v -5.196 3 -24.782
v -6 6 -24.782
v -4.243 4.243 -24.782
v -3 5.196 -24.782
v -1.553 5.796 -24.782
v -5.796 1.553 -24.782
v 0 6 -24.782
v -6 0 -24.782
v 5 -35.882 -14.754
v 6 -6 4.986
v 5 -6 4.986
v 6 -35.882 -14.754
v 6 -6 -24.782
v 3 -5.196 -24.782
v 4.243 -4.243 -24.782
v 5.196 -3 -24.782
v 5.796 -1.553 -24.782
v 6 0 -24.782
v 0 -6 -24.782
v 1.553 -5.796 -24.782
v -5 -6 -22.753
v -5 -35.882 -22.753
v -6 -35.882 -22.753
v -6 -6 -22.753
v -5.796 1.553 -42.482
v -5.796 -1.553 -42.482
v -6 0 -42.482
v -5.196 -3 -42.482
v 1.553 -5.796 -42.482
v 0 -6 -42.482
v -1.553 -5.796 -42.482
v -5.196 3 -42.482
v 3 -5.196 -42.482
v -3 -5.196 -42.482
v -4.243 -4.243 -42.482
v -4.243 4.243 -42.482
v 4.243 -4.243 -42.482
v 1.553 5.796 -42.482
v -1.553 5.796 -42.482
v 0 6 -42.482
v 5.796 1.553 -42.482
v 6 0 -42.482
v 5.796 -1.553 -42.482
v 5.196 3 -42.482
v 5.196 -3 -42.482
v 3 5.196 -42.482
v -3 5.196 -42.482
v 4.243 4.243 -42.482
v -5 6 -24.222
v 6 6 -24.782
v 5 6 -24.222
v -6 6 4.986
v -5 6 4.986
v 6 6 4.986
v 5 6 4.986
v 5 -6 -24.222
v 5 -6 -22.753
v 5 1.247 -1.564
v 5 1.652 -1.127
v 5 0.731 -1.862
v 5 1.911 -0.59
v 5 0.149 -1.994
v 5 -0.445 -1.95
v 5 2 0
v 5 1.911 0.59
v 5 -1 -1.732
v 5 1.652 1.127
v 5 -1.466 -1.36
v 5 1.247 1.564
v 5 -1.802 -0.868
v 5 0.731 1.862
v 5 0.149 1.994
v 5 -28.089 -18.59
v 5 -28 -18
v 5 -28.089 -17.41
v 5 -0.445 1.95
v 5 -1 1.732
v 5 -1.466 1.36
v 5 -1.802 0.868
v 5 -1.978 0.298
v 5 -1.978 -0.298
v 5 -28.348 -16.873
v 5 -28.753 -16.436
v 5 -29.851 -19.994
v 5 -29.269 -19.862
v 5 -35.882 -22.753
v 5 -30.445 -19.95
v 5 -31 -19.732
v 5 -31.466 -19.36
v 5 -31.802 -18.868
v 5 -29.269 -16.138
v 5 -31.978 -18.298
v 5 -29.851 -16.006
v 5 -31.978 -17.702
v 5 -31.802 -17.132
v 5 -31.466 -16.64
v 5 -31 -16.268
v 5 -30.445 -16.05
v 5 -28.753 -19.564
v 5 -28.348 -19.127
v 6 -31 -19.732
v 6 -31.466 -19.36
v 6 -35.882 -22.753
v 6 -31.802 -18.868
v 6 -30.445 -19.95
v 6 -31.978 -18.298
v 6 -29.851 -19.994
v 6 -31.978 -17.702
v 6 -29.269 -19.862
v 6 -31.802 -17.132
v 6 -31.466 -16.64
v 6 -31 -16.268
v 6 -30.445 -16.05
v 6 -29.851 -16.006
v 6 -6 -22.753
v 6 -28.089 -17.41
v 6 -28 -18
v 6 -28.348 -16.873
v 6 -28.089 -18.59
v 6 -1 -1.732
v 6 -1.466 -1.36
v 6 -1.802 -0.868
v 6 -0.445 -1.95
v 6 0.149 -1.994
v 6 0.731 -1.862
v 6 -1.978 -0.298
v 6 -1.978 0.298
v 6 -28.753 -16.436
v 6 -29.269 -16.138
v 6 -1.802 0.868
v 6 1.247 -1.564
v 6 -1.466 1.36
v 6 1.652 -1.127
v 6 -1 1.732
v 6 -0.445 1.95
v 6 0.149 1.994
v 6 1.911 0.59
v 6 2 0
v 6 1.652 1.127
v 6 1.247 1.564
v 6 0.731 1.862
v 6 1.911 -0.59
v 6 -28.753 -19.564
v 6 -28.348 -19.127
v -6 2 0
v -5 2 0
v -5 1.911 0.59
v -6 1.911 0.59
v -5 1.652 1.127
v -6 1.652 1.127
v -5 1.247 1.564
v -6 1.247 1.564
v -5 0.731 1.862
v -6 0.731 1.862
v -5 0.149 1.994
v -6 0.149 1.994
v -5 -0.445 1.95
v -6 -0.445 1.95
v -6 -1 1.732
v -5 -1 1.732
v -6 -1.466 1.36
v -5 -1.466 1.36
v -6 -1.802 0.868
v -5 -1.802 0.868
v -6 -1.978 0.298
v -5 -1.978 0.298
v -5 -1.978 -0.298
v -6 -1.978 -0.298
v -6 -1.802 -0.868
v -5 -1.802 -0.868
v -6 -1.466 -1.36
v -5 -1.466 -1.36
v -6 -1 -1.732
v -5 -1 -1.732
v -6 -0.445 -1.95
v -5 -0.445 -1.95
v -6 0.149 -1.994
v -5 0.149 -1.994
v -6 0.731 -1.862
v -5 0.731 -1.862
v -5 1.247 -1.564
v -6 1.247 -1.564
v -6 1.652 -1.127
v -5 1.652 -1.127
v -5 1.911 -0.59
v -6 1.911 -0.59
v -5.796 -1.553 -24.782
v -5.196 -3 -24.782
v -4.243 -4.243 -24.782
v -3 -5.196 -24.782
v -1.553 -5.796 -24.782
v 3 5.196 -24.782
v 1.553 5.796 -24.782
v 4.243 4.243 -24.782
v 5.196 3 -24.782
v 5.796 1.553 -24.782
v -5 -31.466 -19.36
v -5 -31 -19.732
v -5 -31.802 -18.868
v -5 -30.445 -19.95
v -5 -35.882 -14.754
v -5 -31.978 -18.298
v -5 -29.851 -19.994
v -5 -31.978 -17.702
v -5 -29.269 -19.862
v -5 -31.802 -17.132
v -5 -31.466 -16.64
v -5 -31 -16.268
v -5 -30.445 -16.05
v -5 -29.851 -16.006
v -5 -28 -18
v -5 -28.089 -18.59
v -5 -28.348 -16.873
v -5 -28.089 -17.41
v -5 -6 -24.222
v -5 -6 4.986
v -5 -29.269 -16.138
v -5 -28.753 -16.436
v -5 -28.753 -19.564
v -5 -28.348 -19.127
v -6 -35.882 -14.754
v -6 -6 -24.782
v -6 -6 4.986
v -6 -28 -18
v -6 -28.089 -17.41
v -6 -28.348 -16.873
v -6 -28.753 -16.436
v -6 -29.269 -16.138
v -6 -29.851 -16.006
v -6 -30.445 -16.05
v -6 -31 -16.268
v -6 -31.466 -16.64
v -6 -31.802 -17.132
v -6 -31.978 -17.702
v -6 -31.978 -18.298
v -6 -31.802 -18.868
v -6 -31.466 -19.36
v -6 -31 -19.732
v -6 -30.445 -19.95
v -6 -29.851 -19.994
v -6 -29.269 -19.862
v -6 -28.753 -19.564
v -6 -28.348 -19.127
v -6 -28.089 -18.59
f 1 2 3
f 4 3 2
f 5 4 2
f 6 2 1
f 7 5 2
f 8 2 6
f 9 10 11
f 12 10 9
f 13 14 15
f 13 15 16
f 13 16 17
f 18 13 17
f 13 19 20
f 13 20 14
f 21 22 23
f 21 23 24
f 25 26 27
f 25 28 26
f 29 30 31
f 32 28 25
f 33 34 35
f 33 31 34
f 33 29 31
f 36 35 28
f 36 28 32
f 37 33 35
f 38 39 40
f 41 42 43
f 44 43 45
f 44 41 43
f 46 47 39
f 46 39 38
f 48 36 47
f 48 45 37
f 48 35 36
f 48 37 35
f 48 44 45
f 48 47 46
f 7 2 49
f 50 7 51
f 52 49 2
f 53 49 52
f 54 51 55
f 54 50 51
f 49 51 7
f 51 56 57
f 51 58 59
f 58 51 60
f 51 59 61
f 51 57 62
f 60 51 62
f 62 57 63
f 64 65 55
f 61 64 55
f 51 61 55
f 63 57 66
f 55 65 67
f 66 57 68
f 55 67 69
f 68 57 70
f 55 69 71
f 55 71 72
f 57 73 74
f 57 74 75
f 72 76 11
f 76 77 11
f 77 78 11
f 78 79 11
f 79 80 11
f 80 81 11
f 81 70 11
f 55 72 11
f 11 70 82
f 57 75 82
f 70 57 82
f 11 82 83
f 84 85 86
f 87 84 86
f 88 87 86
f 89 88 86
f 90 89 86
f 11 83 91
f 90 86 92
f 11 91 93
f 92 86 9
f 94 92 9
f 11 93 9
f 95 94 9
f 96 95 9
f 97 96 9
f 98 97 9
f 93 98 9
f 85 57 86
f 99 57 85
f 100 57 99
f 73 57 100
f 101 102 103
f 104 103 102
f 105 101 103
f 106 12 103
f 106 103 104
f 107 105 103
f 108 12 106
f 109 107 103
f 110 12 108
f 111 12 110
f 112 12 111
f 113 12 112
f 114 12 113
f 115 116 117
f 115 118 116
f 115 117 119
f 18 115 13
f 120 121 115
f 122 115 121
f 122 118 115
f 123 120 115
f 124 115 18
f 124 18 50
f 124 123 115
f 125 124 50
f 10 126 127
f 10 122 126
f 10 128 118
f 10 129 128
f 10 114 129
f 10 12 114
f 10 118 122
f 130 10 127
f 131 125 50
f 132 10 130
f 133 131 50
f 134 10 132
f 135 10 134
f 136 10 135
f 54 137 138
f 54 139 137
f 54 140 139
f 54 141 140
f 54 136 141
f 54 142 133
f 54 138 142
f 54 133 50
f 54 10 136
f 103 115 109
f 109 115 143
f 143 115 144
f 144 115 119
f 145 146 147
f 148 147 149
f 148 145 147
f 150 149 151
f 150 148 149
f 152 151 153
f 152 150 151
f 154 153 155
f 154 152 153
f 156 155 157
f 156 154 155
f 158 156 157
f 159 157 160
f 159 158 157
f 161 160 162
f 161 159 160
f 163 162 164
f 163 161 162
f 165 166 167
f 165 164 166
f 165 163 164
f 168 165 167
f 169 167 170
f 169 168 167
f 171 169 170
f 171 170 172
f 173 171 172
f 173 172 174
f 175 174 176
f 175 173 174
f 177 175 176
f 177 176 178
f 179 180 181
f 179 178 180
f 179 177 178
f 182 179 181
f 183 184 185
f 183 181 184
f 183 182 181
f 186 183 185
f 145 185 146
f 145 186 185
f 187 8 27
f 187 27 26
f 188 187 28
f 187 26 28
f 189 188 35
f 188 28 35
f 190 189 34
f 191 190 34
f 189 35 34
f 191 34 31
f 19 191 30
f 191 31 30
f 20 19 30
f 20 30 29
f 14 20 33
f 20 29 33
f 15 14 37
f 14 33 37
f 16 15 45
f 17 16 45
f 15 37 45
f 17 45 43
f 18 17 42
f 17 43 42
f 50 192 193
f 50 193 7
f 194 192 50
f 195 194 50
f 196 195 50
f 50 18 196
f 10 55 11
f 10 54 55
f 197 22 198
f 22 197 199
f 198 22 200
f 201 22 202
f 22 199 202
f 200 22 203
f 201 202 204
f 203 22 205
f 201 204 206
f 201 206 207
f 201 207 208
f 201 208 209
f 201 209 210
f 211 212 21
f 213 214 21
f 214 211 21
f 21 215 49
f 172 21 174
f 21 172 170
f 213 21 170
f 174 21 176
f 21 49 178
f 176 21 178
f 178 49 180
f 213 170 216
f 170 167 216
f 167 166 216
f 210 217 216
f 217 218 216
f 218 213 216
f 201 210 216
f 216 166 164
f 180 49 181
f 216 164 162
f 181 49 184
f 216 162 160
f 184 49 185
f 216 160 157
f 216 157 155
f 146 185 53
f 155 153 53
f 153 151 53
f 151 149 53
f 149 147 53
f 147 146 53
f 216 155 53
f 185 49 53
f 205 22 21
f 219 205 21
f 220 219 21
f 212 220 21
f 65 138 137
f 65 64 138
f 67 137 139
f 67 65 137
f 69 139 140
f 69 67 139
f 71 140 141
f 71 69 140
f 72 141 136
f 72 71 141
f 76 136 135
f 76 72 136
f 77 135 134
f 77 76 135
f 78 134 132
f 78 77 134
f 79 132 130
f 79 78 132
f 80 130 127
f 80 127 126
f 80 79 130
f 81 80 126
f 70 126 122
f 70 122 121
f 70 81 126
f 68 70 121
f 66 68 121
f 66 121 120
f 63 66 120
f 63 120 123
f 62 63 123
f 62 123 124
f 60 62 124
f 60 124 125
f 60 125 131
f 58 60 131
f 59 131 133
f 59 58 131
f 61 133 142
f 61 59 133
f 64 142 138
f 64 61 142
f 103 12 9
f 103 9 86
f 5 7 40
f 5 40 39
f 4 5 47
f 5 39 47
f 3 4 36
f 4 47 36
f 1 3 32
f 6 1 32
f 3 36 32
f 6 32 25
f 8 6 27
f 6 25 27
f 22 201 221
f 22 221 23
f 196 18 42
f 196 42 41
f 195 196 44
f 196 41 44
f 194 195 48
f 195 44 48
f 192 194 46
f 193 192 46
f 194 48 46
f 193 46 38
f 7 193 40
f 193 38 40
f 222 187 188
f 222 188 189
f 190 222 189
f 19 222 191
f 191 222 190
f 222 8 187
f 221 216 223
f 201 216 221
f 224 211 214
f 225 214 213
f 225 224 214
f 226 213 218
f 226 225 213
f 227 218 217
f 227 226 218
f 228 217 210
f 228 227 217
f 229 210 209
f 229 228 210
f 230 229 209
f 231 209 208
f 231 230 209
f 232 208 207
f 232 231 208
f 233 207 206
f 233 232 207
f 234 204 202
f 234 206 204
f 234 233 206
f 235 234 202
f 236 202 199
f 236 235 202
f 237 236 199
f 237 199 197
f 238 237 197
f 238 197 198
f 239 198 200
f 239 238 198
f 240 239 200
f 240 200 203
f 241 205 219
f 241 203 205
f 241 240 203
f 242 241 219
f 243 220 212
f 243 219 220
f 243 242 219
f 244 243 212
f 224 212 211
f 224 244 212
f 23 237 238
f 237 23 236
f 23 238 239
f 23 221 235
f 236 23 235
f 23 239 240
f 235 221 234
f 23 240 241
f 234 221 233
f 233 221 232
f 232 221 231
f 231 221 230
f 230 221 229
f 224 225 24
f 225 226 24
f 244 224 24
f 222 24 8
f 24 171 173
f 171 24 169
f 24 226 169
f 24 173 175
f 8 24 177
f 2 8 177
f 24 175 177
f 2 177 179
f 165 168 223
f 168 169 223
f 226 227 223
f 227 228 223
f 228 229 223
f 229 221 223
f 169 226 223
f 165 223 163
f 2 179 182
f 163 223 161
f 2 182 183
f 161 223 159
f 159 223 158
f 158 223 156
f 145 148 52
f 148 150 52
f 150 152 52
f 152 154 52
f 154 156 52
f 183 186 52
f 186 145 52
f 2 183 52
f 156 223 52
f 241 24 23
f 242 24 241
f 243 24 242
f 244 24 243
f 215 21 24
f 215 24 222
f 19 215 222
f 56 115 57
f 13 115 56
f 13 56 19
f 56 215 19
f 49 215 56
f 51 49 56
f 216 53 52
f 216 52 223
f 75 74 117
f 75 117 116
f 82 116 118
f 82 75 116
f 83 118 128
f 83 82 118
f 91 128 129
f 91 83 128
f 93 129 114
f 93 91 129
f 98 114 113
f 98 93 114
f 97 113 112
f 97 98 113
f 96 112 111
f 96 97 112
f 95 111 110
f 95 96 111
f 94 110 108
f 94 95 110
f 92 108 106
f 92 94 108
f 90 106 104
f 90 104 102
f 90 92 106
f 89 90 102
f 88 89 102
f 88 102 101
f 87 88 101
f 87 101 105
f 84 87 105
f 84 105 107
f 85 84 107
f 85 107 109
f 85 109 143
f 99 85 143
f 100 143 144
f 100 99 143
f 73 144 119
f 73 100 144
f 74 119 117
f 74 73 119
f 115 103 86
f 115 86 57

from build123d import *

# Parameters (mm, degrees)
F0_R          = 2
F1_DEPTH      = 6
F2_W          = 10
F2_H          = 33.9879472775
F3_DEPTH      = 6.001
F3_DEPTH_BACK = 35.8828483539
F5_DEPTH      = 17.7


with BuildPart() as f1:
    # F0 (on Right) → F1 (new body, symmetric)
    with BuildSketch(Plane.YZ):
        Polygon((-6, 4.9863578752), (-35.8818483539, -14.7544573992), (-35.8818483539, -22.7532479912), (-6, -22.7532479912), (-6, -42.48220101), (6, -42.48220101), (6, 4.9863578752), align=None)
        with Locations((-30, -18)):
            Circle(F0_R, mode=Mode.SUBTRACT)
        Circle(F0_R, mode=Mode.SUBTRACT)
    extrude(amount=F1_DEPTH, both=True)

    # F2 (on Front) → F3 (cut, two sides)
    with BuildSketch(Plane.XZ) as f3_sk:
        with Locations((0, -7.2282501862)):
            Rectangle(F2_W, F2_H)
    extrude(amount=-F3_DEPTH, mode=Mode.SUBTRACT)
    extrude(f3_sk.sketch, amount=F3_DEPTH_BACK, mode=Mode.SUBTRACT)

    # F4 (on face) → F5 (cut)
    with BuildSketch(Plane(origin=(0, 0, -42.48220101), x_dir=(1, 0, 0), z_dir=(0, 0, -1))):
        with BuildLine():
            Line((-6, -6), (0, -6))
            ThreePointArc((0, -6), (-4.2426406871, -4.2426406871), (-6, 0))
            Line((-6, 0), (-6, -6))
        make_face()
        with BuildLine():
            ThreePointArc((-6, 0), (-4.2426406871, 4.2426406871), (0, 6))
            Line((0, 6), (-6, 6))
            Line((-6, 6), (-6, 0))
        make_face()
        with BuildLine():
            ThreePointArc((0, 6), (4.2426406871, 4.2426406871), (6, 0))
            Line((6, 0), (6, 6))
            Line((6, 6), (0, 6))
        make_face()
        with BuildLine():
            Line((6, -6), (6, 0))
            ThreePointArc((6, 0), (4.2426406871, -4.2426406871), (0, -6))
            Line((0, -6), (6, -6))
        make_face()
    extrude(amount=-F5_DEPTH, mode=Mode.SUBTRACT)


solid = f1.part
